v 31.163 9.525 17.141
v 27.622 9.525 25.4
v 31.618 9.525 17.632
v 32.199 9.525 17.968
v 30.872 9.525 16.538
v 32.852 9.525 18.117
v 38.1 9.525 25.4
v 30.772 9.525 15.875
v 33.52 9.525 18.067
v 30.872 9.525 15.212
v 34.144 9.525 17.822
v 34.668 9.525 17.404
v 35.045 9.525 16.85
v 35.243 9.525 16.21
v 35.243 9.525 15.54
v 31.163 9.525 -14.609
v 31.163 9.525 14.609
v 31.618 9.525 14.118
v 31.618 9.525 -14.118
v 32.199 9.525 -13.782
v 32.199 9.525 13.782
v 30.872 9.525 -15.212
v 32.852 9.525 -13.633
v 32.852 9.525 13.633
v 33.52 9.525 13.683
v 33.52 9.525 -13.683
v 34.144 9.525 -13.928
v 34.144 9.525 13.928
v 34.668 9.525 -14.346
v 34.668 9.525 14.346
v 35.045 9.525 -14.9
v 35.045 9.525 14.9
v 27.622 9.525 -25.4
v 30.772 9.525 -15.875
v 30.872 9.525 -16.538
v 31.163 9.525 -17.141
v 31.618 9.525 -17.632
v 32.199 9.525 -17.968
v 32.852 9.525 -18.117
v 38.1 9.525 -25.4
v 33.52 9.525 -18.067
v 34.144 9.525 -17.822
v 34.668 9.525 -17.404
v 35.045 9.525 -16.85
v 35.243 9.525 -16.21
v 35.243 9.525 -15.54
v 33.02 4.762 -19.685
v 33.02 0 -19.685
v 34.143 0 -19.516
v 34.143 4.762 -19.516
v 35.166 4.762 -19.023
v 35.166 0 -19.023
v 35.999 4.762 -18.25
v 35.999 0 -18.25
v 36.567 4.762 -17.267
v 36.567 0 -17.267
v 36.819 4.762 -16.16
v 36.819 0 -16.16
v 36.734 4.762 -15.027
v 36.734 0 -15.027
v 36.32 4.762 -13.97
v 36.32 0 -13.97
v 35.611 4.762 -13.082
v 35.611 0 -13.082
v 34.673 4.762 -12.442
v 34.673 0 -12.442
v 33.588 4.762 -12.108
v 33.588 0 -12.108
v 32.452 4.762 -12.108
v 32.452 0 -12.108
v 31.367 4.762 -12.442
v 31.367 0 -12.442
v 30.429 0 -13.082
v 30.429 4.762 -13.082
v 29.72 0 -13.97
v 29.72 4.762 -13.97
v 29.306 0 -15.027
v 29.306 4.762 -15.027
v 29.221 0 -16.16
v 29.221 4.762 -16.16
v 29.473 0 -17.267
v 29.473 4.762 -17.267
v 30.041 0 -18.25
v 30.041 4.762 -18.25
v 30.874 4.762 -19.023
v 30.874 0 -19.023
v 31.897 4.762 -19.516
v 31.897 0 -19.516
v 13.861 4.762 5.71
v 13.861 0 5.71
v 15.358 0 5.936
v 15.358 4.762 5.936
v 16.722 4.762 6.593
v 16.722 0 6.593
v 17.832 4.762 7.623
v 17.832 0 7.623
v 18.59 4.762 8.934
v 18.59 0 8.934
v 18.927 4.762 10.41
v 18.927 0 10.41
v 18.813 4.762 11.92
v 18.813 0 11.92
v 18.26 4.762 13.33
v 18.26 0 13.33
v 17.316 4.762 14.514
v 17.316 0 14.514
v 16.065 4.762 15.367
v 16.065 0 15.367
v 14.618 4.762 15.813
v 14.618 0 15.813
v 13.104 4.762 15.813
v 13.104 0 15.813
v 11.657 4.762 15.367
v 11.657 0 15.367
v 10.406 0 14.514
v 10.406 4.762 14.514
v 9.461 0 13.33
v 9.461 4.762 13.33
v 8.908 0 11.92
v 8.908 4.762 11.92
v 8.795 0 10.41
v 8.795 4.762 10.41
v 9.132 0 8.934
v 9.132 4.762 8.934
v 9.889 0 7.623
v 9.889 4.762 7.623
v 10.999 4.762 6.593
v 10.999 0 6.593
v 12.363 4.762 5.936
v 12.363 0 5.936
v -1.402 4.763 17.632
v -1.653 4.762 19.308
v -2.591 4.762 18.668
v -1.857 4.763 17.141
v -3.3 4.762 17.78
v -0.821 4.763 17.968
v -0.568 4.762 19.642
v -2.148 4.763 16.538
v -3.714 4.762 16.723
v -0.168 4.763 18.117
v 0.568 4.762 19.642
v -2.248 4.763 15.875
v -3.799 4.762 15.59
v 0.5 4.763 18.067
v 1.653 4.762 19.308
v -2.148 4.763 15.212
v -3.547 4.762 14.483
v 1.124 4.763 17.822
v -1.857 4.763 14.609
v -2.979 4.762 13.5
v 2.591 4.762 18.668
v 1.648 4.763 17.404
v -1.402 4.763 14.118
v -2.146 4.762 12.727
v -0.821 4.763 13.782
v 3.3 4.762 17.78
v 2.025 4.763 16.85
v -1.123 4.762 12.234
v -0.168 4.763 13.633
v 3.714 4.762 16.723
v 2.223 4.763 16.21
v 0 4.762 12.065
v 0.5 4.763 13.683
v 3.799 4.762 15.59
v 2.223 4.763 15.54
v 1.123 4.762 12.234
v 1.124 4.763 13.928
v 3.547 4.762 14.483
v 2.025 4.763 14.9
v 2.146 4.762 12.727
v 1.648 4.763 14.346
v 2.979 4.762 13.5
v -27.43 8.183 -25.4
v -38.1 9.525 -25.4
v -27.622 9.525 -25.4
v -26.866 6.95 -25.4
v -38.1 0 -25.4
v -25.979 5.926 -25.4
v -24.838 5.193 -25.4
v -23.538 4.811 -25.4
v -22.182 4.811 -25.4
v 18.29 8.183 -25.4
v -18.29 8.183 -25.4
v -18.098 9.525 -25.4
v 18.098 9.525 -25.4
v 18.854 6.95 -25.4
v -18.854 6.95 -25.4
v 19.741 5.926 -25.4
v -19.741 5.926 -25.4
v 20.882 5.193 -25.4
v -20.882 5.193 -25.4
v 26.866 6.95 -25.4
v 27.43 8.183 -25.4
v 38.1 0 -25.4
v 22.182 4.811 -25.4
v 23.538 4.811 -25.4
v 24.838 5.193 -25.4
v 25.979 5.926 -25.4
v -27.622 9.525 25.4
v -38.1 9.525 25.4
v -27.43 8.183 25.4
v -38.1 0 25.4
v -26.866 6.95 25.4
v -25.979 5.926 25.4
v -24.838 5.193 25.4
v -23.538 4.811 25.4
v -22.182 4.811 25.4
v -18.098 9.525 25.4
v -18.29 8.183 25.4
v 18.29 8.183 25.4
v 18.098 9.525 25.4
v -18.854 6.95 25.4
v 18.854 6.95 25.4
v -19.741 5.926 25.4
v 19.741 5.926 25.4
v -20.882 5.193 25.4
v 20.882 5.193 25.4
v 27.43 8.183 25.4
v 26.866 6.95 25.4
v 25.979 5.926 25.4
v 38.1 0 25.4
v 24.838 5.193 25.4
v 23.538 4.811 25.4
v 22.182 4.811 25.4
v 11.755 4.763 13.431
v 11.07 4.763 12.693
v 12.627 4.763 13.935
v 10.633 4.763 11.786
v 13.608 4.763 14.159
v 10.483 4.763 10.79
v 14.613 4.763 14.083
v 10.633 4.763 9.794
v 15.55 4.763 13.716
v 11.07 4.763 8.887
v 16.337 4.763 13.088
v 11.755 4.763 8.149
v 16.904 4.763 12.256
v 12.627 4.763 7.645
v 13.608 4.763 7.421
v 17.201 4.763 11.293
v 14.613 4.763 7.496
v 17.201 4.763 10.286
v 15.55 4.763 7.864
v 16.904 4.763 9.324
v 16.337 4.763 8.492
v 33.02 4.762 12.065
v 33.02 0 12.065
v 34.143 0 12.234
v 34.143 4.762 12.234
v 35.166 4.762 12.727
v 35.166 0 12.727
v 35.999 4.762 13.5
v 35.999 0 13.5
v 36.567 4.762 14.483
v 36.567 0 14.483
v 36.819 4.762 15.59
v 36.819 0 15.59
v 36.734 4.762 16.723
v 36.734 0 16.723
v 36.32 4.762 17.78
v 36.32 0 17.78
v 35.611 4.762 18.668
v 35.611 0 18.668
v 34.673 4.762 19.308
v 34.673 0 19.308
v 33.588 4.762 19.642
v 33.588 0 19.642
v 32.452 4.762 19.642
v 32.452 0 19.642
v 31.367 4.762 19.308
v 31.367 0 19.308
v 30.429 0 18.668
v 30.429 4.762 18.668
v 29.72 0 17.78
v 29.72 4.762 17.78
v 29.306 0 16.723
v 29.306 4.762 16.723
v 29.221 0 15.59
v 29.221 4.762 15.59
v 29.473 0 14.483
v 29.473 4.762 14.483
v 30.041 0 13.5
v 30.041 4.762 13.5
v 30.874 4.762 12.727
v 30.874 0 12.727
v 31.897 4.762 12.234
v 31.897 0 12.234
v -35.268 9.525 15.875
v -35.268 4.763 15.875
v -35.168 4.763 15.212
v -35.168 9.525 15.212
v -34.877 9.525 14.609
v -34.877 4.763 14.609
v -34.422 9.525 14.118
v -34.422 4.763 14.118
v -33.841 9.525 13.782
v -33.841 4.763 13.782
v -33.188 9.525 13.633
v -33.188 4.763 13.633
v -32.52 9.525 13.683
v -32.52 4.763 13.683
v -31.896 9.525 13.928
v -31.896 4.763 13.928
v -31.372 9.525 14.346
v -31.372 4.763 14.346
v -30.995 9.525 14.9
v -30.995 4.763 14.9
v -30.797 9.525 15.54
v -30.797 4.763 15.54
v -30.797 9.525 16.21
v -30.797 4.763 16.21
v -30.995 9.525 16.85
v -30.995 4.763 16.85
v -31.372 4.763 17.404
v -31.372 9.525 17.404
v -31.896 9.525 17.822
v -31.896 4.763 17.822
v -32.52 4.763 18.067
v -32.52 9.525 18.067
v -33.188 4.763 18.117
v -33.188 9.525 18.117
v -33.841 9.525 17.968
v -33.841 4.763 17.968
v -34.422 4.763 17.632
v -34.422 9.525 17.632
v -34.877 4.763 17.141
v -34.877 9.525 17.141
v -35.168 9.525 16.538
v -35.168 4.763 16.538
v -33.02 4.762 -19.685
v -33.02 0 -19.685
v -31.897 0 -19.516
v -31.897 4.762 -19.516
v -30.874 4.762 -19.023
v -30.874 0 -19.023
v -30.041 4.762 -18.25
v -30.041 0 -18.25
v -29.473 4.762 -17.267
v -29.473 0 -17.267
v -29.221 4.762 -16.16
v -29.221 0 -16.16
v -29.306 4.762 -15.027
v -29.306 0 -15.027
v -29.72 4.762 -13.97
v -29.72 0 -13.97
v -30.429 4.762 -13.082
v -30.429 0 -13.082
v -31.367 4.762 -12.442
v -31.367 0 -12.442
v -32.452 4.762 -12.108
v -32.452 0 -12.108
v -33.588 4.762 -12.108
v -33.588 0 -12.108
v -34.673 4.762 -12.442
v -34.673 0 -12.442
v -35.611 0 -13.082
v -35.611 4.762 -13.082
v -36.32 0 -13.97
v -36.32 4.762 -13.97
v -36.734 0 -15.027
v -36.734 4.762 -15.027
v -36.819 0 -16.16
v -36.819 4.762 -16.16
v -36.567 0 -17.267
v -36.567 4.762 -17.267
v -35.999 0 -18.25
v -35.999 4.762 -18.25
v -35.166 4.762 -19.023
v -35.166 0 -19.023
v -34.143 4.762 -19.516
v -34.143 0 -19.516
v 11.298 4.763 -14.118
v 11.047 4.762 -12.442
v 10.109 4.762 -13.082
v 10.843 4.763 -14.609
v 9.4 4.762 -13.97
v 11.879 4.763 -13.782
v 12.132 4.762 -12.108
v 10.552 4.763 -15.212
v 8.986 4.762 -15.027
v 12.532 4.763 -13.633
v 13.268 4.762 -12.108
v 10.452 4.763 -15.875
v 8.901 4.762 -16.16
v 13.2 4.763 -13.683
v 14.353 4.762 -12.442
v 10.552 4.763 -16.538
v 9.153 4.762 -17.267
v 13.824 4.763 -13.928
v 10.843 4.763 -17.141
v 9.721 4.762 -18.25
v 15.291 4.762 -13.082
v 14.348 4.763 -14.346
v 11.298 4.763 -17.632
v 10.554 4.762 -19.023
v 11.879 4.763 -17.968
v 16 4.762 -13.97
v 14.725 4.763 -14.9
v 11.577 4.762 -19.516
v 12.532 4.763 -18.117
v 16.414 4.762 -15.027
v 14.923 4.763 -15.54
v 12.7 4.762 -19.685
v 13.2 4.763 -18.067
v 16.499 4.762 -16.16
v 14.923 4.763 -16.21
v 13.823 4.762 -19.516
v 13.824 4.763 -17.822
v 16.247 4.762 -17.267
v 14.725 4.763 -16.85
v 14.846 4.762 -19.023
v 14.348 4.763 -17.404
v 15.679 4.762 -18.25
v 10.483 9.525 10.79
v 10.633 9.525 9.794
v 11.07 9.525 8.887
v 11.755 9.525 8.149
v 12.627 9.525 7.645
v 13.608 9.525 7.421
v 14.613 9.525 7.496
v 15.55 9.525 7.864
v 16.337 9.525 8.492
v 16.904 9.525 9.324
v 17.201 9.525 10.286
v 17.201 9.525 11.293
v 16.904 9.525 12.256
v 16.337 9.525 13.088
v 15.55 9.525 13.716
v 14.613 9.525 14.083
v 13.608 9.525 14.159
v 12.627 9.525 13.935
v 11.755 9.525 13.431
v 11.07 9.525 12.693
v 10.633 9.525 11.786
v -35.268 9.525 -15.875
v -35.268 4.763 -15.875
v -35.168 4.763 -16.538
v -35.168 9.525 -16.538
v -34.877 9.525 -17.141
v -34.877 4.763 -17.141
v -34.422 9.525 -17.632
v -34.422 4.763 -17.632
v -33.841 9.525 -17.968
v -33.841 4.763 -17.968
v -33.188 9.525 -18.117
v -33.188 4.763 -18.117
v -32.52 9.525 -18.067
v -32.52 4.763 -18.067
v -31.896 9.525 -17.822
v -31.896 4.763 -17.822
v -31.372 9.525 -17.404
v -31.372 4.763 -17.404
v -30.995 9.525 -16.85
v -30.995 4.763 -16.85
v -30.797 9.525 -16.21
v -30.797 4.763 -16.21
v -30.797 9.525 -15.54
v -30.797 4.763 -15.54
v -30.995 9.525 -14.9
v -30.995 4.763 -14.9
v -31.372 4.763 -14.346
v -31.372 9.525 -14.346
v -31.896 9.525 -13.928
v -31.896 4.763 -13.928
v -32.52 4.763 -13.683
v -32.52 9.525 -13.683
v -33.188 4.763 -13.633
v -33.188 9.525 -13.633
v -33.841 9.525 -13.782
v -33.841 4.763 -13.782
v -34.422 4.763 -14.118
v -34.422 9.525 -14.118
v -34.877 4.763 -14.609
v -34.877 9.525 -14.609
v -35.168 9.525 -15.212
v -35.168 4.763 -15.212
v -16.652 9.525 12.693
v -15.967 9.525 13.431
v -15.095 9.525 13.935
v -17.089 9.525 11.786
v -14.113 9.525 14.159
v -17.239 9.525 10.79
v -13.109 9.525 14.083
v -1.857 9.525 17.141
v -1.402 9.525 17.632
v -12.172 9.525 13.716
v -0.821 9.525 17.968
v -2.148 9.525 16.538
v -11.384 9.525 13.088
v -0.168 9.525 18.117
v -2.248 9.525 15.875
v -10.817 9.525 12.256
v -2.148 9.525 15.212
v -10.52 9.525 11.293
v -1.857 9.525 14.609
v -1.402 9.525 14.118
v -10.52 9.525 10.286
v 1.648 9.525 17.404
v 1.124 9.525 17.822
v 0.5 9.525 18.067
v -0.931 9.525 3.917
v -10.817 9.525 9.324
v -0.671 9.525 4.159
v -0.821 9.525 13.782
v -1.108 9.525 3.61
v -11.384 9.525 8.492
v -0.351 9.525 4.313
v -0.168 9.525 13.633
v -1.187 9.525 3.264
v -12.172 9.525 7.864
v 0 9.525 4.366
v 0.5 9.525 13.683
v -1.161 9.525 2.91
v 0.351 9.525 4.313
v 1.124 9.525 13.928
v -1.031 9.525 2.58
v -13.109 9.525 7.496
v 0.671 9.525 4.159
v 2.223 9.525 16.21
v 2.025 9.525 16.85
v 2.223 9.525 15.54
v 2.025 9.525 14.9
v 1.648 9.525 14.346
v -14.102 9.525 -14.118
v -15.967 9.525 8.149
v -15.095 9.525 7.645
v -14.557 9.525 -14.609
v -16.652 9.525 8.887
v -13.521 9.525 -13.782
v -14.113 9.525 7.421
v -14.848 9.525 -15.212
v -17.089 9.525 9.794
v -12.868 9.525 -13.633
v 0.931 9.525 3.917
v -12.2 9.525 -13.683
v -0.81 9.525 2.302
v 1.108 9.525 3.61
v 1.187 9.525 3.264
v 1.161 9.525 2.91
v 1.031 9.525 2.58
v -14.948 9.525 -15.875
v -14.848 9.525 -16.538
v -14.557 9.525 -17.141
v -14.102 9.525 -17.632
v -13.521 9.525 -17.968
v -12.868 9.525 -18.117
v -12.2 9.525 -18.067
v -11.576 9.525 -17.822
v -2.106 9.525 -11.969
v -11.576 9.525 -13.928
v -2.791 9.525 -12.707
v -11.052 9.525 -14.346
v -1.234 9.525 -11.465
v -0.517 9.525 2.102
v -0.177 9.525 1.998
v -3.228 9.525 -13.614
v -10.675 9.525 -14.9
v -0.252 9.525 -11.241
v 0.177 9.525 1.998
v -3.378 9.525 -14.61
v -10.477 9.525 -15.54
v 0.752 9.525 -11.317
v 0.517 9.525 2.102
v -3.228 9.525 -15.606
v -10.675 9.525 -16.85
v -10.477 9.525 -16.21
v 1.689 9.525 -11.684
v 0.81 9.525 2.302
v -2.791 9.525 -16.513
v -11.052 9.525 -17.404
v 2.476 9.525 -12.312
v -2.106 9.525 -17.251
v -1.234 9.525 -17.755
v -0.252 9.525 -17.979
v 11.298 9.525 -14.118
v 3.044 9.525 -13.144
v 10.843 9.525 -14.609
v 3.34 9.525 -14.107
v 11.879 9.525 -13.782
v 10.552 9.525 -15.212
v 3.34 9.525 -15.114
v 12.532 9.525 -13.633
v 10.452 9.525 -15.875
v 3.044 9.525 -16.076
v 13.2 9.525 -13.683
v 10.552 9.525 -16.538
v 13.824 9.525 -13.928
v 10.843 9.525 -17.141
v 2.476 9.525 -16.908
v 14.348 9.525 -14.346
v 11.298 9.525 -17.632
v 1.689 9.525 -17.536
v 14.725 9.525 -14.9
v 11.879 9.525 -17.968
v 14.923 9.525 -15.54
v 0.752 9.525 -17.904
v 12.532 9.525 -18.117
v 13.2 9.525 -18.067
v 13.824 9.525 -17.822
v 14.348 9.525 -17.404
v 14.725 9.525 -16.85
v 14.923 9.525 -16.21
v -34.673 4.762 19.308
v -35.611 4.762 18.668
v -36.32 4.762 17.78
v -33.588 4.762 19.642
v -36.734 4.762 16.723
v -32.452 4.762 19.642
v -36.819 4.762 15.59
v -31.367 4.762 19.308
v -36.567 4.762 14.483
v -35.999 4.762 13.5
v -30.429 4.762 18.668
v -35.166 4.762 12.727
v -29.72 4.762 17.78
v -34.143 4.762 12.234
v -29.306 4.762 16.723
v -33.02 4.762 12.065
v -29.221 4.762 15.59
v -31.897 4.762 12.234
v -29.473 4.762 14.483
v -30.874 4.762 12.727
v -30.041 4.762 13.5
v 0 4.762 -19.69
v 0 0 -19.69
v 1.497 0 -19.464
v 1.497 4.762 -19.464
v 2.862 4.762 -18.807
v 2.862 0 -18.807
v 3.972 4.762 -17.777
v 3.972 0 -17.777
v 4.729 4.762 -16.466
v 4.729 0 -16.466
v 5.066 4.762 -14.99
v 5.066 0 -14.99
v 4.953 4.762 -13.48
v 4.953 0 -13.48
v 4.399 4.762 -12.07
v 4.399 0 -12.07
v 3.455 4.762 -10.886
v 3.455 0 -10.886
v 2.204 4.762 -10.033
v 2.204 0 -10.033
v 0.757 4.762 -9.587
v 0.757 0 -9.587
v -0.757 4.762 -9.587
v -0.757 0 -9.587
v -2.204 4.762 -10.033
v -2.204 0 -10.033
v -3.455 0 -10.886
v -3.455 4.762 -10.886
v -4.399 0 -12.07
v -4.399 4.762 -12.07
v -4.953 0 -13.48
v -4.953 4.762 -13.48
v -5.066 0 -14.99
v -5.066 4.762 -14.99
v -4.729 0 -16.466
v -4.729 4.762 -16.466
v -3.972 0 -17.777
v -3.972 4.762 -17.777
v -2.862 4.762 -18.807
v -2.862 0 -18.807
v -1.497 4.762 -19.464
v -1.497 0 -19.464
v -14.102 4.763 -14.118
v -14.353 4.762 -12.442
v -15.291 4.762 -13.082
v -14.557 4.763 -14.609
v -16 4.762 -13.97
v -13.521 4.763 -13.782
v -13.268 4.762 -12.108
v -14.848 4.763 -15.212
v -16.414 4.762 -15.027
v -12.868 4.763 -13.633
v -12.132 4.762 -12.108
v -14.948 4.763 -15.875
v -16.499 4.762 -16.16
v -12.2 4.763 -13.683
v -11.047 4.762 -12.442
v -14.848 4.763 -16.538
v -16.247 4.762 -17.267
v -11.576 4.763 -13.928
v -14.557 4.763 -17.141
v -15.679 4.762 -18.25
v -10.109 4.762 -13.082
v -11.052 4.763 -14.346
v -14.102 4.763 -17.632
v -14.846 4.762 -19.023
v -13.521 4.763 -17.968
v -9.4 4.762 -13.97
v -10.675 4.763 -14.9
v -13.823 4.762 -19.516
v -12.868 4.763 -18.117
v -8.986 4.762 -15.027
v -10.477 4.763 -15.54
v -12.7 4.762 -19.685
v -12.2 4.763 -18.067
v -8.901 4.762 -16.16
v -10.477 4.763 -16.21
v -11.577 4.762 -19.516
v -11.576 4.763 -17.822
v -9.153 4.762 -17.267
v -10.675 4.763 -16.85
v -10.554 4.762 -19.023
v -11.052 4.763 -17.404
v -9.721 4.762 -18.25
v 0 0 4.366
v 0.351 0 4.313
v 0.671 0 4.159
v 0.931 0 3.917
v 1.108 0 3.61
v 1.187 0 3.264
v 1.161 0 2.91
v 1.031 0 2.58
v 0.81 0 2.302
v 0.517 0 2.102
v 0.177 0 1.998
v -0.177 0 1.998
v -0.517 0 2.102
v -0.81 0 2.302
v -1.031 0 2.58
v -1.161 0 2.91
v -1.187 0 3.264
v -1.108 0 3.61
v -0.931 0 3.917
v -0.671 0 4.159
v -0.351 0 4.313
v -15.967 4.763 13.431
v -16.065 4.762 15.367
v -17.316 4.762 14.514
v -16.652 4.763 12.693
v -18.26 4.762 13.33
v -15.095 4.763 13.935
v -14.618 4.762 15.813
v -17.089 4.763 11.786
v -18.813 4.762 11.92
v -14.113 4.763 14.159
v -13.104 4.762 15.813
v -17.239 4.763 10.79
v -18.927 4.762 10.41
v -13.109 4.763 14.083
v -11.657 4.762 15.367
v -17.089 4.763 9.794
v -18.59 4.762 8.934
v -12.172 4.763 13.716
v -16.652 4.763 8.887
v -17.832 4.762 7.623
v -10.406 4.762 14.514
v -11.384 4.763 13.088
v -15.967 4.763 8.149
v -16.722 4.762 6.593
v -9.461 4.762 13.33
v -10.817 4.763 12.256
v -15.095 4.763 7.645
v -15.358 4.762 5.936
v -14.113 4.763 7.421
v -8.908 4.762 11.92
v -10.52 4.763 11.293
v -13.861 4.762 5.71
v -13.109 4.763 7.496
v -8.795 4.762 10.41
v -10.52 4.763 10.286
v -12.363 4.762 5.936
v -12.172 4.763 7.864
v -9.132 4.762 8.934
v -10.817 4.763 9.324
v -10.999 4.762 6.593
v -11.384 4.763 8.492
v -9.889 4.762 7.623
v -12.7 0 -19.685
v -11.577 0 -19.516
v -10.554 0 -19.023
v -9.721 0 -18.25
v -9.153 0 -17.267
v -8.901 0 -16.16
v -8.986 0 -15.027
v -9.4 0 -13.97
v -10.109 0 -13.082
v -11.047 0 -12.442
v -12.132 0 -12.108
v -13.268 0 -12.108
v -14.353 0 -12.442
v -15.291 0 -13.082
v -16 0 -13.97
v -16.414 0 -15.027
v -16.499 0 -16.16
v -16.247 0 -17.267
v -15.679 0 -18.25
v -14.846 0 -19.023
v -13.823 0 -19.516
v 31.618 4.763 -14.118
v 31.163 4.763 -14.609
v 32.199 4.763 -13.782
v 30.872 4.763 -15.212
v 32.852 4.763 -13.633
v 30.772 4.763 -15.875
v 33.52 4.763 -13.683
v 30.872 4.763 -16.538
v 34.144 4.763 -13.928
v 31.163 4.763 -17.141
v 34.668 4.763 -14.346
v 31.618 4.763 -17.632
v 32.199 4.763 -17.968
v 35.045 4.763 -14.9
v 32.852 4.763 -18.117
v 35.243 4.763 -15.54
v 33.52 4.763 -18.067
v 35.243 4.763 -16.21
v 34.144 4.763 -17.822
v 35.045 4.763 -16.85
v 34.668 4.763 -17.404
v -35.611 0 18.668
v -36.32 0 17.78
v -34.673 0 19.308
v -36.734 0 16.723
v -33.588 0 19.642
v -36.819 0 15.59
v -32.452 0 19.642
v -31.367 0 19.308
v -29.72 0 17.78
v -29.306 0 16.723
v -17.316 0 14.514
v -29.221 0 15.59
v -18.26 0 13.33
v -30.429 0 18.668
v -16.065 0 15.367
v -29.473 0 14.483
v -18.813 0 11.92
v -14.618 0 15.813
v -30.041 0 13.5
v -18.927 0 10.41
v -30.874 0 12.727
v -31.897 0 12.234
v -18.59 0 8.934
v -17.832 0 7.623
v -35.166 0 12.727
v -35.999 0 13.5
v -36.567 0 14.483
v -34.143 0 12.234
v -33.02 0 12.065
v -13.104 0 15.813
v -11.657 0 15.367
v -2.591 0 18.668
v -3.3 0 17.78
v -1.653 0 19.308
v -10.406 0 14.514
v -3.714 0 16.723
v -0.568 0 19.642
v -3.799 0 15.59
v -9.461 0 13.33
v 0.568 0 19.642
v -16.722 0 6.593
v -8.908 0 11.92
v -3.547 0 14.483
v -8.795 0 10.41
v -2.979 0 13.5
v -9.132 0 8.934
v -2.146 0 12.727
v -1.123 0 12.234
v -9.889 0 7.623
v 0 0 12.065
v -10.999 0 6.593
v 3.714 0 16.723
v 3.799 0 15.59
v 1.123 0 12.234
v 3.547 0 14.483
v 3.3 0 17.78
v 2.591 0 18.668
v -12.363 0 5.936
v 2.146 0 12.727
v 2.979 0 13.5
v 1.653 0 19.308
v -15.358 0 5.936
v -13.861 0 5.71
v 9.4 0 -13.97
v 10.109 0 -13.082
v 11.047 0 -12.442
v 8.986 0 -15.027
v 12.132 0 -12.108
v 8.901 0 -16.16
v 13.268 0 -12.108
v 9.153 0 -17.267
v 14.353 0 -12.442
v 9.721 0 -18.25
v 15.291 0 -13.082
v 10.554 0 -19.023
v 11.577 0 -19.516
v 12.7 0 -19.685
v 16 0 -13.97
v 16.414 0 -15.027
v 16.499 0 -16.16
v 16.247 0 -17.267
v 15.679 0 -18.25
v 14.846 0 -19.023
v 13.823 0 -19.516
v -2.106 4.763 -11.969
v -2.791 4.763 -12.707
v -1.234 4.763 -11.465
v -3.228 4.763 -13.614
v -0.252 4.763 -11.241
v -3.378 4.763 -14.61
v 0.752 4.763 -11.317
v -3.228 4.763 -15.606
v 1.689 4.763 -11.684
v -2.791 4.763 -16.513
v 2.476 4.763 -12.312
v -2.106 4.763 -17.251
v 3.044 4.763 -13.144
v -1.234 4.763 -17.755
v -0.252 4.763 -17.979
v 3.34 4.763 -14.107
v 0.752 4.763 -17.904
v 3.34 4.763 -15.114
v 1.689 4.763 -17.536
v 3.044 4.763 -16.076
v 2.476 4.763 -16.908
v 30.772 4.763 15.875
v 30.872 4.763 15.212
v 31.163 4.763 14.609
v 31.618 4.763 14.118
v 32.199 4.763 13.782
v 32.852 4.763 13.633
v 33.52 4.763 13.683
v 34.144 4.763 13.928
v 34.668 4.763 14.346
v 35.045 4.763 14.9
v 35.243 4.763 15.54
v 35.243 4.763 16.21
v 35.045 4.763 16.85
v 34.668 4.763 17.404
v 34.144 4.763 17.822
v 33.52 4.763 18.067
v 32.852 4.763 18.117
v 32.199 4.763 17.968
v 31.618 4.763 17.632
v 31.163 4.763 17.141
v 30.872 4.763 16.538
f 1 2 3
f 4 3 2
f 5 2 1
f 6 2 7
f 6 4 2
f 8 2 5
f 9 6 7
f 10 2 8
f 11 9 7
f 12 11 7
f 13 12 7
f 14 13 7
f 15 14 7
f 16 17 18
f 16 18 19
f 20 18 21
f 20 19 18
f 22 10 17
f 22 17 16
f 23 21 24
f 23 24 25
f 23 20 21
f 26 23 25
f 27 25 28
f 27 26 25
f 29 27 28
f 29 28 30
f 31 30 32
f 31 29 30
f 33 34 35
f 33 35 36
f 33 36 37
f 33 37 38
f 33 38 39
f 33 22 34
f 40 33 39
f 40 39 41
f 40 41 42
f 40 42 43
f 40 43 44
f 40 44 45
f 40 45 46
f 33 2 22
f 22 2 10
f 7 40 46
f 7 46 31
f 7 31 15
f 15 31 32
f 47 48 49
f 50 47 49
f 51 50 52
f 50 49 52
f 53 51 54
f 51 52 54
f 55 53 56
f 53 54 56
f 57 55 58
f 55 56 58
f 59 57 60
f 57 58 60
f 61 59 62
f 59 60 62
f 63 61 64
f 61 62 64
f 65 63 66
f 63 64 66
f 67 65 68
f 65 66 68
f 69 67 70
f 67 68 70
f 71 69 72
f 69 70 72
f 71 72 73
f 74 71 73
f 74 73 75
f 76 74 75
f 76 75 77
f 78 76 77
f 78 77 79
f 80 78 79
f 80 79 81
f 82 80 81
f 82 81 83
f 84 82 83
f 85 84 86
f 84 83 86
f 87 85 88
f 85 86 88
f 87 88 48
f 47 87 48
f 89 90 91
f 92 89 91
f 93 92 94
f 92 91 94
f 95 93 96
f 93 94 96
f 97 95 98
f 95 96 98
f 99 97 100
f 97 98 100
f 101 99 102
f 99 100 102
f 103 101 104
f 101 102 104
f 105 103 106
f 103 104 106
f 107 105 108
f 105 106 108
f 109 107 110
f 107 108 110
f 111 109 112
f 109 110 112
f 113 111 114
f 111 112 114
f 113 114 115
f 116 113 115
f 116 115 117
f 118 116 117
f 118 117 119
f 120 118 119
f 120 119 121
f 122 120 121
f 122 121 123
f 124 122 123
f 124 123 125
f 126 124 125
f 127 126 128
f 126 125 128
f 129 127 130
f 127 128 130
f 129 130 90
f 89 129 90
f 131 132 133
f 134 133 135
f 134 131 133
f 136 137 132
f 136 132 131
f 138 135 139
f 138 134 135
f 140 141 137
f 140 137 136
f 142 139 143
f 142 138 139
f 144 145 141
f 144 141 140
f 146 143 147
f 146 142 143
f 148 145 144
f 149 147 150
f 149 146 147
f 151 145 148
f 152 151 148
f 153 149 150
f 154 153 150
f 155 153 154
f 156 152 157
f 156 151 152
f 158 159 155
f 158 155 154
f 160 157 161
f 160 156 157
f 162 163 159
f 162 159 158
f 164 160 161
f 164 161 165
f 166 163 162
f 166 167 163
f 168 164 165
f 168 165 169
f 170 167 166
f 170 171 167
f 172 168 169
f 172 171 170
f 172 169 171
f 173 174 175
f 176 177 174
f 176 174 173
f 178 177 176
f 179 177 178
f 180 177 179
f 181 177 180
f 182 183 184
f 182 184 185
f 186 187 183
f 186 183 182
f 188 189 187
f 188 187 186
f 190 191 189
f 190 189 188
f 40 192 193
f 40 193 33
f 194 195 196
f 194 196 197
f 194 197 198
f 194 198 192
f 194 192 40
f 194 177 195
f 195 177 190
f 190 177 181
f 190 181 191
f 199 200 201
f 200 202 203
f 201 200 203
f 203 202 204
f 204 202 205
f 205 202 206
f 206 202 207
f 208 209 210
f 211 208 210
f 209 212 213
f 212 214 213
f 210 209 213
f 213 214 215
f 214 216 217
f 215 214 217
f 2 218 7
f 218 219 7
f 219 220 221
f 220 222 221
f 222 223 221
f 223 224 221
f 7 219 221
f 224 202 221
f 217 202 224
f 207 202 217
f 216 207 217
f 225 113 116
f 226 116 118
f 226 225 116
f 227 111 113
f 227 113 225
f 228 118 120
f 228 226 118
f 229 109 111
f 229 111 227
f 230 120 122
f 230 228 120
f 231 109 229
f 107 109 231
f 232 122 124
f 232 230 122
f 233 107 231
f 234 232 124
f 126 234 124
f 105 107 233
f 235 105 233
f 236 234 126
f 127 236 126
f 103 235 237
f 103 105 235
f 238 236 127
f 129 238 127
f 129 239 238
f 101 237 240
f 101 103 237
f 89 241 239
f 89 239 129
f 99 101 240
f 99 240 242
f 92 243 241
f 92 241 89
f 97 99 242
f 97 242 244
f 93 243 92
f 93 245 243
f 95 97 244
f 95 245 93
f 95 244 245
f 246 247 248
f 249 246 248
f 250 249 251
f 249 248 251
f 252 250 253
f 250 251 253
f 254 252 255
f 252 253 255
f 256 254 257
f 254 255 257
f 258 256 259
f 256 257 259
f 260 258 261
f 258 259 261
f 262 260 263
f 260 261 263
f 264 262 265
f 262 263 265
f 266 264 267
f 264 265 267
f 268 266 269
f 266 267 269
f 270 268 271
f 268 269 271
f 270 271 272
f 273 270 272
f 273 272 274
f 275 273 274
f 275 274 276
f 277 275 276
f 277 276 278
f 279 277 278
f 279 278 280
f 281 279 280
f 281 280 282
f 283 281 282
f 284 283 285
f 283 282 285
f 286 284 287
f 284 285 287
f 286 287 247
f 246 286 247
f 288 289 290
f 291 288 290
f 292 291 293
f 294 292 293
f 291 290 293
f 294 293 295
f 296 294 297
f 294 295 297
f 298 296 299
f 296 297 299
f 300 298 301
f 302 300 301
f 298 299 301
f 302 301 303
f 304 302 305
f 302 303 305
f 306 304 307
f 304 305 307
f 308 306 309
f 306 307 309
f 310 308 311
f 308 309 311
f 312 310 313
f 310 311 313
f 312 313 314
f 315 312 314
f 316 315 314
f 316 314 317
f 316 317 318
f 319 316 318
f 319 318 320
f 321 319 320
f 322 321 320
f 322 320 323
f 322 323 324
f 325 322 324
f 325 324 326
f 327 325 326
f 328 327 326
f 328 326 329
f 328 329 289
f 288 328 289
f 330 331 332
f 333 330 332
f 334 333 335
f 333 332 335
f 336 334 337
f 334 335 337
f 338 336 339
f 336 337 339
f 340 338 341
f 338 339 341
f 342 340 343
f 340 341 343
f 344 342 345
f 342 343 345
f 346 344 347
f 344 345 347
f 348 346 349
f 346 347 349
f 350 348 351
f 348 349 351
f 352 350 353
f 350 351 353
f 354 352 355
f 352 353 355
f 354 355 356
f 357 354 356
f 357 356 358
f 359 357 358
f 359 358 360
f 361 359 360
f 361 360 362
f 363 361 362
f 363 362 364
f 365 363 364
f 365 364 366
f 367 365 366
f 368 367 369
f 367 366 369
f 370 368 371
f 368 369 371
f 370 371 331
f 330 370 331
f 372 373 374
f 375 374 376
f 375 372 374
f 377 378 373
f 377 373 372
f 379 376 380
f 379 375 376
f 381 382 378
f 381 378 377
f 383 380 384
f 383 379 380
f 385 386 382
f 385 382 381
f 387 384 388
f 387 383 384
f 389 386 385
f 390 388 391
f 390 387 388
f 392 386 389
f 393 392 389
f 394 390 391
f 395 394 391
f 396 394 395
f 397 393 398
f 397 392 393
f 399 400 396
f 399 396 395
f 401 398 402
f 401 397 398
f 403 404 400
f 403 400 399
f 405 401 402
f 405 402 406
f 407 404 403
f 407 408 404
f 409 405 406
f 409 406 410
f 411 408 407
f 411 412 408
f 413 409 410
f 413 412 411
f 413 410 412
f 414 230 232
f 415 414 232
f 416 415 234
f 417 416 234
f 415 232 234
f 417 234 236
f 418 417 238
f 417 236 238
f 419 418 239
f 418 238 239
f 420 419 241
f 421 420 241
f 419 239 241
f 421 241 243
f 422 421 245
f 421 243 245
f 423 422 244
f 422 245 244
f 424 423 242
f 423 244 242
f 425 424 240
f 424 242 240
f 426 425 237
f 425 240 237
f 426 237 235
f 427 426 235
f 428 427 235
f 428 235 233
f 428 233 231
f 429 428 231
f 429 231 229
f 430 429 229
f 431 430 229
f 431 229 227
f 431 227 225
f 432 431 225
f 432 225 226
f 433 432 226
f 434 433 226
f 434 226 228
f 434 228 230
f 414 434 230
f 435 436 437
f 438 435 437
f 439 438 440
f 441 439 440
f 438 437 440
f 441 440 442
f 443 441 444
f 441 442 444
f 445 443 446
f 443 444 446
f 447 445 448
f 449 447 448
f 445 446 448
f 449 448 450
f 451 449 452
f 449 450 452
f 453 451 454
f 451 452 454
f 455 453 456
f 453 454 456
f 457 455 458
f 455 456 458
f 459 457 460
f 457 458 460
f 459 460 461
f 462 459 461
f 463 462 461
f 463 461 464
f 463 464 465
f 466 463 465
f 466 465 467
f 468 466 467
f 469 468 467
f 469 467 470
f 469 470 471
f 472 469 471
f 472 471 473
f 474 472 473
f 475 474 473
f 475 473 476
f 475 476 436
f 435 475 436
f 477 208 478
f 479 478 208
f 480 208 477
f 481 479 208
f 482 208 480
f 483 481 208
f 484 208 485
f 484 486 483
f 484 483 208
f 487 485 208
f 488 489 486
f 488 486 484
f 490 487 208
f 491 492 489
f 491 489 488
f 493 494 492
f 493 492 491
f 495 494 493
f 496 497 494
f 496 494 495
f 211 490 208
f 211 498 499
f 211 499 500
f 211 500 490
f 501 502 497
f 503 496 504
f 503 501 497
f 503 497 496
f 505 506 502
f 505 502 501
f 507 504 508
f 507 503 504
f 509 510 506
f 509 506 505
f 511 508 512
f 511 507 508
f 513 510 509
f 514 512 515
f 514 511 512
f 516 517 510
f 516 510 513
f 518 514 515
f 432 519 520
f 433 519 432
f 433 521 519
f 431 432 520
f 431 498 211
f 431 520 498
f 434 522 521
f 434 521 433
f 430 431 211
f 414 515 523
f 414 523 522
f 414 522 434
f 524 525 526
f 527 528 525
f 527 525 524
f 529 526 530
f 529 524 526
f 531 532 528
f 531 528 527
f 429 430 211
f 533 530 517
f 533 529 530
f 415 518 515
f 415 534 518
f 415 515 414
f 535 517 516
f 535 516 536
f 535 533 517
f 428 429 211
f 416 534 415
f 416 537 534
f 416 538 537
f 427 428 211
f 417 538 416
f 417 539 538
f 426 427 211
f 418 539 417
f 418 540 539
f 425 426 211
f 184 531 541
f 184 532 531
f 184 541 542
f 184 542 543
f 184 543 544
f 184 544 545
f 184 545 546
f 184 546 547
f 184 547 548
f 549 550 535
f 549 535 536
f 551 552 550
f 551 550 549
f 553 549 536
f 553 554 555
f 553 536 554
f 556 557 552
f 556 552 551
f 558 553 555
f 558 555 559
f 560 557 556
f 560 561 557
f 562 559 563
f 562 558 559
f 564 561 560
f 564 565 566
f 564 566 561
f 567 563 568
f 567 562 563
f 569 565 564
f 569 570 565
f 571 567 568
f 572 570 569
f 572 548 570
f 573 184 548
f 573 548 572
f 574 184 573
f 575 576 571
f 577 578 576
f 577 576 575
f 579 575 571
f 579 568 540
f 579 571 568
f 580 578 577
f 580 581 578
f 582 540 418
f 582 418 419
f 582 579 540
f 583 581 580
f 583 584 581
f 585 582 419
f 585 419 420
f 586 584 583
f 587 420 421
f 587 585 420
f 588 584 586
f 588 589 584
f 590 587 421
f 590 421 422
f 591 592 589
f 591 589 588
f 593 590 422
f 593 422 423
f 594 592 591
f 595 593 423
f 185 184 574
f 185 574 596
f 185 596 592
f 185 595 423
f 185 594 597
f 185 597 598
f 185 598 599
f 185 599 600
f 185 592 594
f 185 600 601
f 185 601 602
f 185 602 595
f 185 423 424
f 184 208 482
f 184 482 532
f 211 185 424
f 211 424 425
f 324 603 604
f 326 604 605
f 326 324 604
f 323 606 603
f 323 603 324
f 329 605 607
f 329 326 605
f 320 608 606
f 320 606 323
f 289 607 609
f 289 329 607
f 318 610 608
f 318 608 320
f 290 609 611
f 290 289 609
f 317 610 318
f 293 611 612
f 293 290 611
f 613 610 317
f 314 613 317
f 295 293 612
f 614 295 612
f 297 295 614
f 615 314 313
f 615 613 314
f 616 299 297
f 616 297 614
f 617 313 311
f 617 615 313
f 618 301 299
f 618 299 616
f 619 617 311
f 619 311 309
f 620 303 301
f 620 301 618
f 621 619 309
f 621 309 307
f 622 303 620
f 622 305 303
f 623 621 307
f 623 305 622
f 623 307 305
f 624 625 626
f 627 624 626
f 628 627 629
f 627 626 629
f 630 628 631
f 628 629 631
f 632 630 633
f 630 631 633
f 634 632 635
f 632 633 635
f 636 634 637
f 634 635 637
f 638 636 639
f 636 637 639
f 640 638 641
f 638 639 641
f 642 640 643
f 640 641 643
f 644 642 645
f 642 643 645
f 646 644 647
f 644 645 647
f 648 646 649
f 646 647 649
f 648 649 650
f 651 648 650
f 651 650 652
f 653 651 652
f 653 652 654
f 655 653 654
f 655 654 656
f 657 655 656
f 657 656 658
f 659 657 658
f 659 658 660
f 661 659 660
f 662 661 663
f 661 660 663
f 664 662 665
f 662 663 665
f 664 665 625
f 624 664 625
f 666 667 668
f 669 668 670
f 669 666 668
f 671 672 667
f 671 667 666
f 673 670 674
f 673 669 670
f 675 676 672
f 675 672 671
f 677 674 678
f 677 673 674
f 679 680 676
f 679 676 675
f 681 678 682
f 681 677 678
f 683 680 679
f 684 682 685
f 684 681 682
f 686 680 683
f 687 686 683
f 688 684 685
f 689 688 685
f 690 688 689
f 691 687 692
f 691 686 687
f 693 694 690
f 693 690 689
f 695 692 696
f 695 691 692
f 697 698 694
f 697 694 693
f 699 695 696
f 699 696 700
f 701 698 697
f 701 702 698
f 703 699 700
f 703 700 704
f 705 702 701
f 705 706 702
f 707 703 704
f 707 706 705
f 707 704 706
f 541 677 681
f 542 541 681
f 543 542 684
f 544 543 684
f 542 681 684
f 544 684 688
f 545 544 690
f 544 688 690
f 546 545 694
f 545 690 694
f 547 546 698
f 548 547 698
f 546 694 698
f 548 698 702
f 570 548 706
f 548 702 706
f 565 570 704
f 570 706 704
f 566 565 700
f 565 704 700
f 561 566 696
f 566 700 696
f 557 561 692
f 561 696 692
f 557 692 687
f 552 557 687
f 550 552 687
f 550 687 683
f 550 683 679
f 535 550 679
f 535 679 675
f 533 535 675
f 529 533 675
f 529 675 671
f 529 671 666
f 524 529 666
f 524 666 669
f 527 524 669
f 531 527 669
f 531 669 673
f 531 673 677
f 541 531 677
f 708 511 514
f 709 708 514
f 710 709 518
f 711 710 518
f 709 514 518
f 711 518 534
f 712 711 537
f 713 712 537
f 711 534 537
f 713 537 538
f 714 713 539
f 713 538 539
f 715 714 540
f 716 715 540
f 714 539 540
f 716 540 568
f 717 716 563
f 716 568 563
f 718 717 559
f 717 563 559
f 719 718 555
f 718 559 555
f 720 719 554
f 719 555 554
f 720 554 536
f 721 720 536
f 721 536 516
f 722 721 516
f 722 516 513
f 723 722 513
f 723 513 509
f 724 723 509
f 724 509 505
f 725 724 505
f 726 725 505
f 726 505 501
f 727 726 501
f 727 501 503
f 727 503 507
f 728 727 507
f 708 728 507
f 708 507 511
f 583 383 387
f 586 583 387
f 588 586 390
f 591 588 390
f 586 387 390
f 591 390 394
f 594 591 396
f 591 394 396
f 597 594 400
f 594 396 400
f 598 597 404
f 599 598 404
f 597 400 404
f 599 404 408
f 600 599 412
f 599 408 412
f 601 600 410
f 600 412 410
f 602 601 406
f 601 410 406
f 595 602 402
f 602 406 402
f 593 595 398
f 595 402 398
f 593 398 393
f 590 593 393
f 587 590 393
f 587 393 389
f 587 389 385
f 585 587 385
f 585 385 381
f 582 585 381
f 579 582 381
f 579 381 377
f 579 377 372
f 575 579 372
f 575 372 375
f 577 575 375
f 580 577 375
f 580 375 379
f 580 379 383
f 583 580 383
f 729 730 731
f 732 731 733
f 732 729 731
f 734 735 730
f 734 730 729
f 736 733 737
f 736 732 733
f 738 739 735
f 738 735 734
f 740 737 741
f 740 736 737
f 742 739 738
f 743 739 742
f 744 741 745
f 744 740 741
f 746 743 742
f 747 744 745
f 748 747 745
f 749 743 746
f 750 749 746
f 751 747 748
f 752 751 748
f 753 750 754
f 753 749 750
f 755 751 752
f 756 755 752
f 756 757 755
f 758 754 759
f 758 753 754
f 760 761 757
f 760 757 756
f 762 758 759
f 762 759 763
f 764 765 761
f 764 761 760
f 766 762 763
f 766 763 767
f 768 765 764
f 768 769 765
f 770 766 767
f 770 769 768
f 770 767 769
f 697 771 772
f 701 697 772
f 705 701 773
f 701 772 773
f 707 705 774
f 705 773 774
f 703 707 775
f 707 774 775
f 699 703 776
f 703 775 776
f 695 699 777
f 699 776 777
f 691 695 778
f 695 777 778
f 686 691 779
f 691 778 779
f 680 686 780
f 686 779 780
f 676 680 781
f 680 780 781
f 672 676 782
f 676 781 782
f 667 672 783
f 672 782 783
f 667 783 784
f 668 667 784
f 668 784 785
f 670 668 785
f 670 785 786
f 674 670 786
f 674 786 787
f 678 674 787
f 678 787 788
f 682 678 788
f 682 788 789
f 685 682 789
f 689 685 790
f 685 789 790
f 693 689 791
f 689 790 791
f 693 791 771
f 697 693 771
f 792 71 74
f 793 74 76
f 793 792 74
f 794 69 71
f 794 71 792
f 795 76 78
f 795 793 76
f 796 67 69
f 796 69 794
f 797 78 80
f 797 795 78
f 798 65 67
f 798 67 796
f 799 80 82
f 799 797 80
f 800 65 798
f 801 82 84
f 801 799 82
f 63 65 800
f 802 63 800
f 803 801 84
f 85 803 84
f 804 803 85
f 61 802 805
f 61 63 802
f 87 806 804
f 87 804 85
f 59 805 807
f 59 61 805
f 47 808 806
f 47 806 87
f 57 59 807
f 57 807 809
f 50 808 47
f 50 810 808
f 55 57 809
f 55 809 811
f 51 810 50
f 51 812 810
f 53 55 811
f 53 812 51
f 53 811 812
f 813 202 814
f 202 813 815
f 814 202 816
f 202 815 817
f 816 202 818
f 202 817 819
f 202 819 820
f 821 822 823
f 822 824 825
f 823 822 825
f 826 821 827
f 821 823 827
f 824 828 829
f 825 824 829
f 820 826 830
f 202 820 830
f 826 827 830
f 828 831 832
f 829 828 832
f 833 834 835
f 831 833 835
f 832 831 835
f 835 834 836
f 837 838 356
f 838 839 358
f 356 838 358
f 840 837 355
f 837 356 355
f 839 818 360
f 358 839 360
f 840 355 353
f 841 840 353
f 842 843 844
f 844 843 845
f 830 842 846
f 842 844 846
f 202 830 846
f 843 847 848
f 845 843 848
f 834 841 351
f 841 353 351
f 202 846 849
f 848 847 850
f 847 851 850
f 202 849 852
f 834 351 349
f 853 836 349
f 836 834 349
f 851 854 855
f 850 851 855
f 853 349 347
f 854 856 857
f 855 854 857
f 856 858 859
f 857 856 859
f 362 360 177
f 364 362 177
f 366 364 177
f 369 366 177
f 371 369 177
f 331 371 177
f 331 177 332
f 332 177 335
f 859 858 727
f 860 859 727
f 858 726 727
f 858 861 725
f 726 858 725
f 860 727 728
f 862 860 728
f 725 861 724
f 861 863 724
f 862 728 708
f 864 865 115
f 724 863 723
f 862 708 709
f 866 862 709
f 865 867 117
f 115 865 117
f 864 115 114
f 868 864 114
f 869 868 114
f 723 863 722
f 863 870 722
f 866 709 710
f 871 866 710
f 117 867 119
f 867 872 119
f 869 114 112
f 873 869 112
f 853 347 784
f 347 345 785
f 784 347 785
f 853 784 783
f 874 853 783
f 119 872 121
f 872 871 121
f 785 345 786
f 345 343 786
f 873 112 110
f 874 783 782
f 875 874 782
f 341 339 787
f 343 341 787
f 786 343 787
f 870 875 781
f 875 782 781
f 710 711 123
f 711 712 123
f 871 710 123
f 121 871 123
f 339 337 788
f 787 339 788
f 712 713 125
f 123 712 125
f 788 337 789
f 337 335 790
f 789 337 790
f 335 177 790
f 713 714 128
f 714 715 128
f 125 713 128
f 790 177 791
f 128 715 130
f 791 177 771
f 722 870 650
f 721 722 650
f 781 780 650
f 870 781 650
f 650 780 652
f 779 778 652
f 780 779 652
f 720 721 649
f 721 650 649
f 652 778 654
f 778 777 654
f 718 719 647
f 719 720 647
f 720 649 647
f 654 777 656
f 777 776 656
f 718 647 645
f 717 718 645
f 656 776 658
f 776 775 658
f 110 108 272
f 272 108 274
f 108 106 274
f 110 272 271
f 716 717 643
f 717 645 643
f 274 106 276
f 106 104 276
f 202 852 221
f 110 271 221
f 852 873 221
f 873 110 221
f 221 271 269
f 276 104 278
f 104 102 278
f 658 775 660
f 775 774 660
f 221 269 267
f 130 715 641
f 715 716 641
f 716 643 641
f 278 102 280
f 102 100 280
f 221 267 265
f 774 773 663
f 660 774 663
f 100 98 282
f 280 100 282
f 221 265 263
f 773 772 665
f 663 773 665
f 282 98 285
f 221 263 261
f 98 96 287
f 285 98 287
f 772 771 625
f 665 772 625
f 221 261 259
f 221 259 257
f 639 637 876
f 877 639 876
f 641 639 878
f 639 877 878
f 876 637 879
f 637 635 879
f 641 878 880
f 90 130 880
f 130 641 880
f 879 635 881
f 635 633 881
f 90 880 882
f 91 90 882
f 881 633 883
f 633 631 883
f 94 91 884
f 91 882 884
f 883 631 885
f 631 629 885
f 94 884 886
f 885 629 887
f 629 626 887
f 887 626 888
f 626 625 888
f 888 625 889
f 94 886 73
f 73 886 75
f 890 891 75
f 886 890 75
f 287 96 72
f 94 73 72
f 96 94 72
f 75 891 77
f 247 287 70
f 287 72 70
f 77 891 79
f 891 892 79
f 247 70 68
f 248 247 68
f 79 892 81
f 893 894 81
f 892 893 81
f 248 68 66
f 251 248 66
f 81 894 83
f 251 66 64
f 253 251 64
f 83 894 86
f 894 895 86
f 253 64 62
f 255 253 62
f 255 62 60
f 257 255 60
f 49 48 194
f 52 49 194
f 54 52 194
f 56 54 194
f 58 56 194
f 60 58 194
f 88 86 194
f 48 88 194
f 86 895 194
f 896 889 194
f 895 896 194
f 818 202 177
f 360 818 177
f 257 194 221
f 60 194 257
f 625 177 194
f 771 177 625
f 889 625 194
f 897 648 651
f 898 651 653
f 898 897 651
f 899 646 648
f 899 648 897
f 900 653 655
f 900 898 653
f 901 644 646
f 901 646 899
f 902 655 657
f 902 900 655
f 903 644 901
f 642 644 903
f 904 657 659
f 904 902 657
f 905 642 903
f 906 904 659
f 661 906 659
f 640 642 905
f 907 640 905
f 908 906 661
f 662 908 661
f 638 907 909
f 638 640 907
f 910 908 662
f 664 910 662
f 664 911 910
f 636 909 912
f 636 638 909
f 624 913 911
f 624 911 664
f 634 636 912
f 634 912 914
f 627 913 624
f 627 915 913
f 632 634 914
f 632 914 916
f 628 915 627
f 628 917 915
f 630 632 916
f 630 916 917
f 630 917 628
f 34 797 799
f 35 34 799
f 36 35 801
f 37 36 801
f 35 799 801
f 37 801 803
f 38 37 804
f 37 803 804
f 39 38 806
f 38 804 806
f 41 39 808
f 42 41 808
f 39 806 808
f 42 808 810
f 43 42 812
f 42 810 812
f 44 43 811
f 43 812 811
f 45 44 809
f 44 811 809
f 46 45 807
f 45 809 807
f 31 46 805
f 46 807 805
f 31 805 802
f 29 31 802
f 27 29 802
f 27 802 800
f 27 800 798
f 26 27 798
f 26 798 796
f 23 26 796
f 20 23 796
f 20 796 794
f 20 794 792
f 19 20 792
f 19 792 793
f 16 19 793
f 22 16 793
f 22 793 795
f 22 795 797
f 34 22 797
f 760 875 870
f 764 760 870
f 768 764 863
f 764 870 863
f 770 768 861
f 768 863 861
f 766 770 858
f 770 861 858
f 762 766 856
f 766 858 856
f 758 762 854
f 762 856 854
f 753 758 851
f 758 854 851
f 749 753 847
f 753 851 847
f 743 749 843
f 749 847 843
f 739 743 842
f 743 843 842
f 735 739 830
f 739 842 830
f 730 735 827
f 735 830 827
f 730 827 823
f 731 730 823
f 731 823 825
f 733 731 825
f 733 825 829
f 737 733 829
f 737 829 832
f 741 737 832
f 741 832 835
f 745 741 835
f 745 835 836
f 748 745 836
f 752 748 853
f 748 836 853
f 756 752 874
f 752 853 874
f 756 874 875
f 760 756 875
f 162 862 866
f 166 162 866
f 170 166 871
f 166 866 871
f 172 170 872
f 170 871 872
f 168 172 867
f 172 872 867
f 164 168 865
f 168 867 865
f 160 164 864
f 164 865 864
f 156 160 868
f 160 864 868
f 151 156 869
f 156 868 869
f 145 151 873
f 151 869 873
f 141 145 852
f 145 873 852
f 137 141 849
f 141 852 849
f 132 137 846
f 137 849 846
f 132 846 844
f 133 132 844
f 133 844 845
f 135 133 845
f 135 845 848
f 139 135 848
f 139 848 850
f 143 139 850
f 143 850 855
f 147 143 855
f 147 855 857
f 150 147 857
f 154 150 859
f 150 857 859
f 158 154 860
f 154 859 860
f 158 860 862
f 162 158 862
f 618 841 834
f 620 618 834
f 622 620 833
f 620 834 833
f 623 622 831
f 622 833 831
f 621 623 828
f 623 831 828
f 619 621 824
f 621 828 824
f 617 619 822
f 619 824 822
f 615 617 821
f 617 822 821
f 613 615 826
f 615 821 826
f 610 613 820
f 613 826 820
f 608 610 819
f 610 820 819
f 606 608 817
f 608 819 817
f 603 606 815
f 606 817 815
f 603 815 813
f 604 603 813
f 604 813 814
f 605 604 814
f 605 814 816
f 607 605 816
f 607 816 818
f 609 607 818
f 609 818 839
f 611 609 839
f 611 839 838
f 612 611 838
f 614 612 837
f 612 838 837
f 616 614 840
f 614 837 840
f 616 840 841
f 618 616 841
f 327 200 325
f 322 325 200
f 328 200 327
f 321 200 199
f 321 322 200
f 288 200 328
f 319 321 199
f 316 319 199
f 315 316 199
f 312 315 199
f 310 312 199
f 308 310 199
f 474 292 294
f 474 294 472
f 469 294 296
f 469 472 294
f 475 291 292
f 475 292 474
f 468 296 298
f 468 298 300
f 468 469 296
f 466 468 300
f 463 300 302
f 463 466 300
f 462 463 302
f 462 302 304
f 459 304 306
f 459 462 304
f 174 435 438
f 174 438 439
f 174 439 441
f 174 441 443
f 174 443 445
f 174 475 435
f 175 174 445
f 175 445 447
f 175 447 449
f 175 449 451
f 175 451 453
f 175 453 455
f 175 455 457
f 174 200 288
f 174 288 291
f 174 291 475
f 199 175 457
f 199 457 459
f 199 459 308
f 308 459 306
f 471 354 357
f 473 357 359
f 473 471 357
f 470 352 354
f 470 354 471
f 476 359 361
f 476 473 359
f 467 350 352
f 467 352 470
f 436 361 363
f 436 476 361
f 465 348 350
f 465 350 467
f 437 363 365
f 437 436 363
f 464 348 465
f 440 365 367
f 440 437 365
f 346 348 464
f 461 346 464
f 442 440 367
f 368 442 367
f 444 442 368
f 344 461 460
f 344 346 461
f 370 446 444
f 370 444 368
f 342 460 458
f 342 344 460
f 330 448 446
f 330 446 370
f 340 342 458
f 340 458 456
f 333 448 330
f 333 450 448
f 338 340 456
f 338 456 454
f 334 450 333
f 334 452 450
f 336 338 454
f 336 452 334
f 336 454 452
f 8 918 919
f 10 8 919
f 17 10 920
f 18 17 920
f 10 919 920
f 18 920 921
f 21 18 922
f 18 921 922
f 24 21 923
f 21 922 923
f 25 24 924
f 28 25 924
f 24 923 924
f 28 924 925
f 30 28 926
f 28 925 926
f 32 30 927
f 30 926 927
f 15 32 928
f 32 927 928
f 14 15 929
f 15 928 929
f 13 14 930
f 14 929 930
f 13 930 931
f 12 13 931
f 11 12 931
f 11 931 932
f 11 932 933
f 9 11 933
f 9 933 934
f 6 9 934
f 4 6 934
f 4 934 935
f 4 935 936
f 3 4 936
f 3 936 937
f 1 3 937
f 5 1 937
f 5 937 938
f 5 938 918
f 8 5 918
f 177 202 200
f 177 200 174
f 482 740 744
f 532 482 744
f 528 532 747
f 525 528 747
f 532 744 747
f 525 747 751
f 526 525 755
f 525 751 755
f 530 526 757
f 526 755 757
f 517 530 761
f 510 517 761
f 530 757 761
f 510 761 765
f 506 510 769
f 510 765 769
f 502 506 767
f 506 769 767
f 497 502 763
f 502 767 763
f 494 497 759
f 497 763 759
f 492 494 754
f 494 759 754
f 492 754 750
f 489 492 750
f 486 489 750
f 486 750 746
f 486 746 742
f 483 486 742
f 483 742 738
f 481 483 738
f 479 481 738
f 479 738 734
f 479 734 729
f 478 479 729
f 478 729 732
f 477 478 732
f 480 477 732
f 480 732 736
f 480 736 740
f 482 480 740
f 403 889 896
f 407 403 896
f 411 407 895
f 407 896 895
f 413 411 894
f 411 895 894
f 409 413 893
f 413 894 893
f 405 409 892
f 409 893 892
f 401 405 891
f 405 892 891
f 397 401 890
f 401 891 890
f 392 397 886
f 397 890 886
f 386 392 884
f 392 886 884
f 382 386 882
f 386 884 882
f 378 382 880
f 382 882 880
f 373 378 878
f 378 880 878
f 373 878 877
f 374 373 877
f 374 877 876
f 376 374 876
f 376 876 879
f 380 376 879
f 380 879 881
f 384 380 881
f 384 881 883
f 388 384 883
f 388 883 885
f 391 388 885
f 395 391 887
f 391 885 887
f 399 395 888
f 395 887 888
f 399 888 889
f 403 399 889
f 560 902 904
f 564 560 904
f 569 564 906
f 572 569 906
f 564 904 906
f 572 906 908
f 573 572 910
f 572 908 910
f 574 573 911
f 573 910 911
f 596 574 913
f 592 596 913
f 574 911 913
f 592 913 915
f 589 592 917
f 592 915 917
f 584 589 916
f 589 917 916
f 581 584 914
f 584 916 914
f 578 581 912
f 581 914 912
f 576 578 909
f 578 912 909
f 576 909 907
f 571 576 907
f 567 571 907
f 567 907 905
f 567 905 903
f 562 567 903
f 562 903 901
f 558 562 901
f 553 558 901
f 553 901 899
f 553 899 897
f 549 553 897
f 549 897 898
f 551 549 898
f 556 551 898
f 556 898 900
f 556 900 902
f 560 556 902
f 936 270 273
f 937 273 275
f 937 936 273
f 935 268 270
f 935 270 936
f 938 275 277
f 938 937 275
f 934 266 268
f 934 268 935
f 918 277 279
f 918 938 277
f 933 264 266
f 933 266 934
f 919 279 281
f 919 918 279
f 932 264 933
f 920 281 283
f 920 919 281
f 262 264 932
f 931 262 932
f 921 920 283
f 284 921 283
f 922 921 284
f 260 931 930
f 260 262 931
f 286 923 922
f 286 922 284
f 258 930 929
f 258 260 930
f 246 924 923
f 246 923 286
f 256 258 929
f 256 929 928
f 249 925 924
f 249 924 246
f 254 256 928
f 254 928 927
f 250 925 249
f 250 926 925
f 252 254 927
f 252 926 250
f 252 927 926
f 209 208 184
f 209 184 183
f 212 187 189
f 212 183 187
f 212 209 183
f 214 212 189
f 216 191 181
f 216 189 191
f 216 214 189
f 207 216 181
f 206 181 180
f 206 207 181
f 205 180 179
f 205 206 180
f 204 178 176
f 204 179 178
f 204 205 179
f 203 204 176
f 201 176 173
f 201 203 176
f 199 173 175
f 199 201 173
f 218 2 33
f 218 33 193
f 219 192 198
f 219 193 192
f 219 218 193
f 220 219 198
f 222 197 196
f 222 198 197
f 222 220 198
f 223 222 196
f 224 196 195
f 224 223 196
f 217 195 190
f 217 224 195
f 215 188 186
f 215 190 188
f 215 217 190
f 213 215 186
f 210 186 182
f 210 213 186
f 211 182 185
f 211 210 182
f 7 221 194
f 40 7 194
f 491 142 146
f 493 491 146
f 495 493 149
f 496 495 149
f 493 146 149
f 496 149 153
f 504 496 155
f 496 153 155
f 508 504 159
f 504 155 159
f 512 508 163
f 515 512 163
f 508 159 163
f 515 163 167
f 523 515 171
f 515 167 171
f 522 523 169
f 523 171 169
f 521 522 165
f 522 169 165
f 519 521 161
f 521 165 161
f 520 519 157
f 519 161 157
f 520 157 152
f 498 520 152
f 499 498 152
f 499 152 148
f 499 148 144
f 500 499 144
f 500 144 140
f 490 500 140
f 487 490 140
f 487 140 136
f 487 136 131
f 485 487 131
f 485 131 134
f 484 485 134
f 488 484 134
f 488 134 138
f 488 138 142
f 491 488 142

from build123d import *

# Parameters (mm, degrees)
SKETCH1_W               = 76.2
SKETCH1_H               = 50.8
BOSS_EXTRUDE1_DEPTH     = 9.525
F_1_4_CLEARANCE_HOLE1_D = 6.7564
CUT_EXTRUDE1_DEPTH      = 65.210401221
SKETCH5_R               = 1.190625
CUT_EXTRUDE2_DEPTH      = 47.770670564
F_8_CLEARANCE_HOLE1_D   = 4.4958
SKETCH8_R               = 5.08
CUT_EXTRUDE3_DEPTH      = 4.7625
SKETCH9_R               = 3.81
CUT_EXTRUDE4_DEPTH      = 4.7625


with BuildPart() as part:
    # Sketch1 → Boss-Extrude1 (new body)
    with BuildSketch(Plane(origin=(0, 0, 0), x_dir=(1, 0, 0), z_dir=(0, 1, 0))):
        Rectangle(SKETCH1_W, SKETCH1_H)
    extrude(amount=BOSS_EXTRUDE1_DEPTH)

    # 1/4 Clearance Hole1 (through all)
    with Locations(Plane(origin=(0, 9.525, 0), x_dir=(1, 0, 0), z_dir=(0, 1, 0))):
        with Locations((0, 14.61008), (-13.86078, -10.78992), (13.86078, -10.78992)):
            Hole(F_1_4_CLEARANCE_HOLE1_D / 2)

    # Sketch4 → Cut-Extrude1 (cut, through all)
    with BuildSketch(Plane.XY.offset(25.4)):
        with BuildLine():
            Line((-27.6225, 9.525), (-18.0975, 9.525))
            ThreePointArc((-18.0975, 9.525), (-22.86, 4.7625), (-27.6225, 9.525))
        make_face()
        with BuildLine():
            Line((18.0975, 9.525), (27.6225, 9.525))
            ThreePointArc((27.6225, 9.525), (22.86, 4.7625), (18.0975, 9.525))
        make_face()
    extrude(amount=-CUT_EXTRUDE1_DEPTH, mode=Mode.SUBTRACT)

    # Sketch5 → Cut-Extrude2 (cut, through all)
    with BuildSketch(Plane(origin=(0, 9.525, 0), x_dir=(1, 0, 0), z_dir=(0, 1, 0))):
        with Locations(Location((0, -3.175, 0), (0, 0, 270))):
            Circle(SKETCH5_R)
    extrude(amount=-CUT_EXTRUDE2_DEPTH, mode=Mode.SUBTRACT)

    # #8 Clearance Hole1 (through all)
    with Locations(Plane(origin=(0, 9.525, 0), x_dir=(1, 0, 0), z_dir=(0, 1, 0))):
        with Locations((-33.02, 15.875), (-33.02, -15.875), (33.02, -15.875), (33.02, 15.875), (-12.7, 15.875), (12.7, 15.875), (0, -15.875)):
            Hole(F_8_CLEARANCE_HOLE1_D / 2)

    # Sketch8 → Cut-Extrude3 (cut)
    with BuildSketch(Plane.XZ):
        with Locations(Location((-13.86078, 10.78992, 0), (0, 0, 270))):
            Circle(SKETCH8_R)
        with Locations(Location((13.86078, 10.78992, 0), (0, 0, 270))):
            Circle(SKETCH8_R)
        with Locations(Location((0, -14.61008, 0), (0, 0, 270))):
            Circle(SKETCH8_R)
    extrude(amount=-CUT_EXTRUDE3_DEPTH, mode=Mode.SUBTRACT)

    # Sketch9 → Cut-Extrude4 (cut)
    with BuildSketch(Plane.XZ):
        with Locations(Location((-33.02, 15.875, 0), (0, 0, 270))):
            Circle(SKETCH9_R)
        with Locations(Location((0, 15.875, 0), (0, 0, 270))):
            Circle(SKETCH9_R)
        with Locations(Location((33.02, 15.875, 0), (0, 0, 270))):
            Circle(SKETCH9_R)
        with Locations(Location((33.02, -15.875, 0), (0, 0, 270))):
            Circle(SKETCH9_R)
        with Locations(Location((12.7, -15.875, 0), (0, 0, 270))):
            Circle(SKETCH9_R)
        with Locations(Location((-12.7, -15.875, 0), (0, 0, 270))):
            Circle(SKETCH9_R)
        with Locations(Location((-33.02, -15.875, 0), (0, 0, 270))):
            Circle(SKETCH9_R)
    extrude(amount=-CUT_EXTRUDE4_DEPTH, mode=Mode.SUBTRACT)


solid = part.part
